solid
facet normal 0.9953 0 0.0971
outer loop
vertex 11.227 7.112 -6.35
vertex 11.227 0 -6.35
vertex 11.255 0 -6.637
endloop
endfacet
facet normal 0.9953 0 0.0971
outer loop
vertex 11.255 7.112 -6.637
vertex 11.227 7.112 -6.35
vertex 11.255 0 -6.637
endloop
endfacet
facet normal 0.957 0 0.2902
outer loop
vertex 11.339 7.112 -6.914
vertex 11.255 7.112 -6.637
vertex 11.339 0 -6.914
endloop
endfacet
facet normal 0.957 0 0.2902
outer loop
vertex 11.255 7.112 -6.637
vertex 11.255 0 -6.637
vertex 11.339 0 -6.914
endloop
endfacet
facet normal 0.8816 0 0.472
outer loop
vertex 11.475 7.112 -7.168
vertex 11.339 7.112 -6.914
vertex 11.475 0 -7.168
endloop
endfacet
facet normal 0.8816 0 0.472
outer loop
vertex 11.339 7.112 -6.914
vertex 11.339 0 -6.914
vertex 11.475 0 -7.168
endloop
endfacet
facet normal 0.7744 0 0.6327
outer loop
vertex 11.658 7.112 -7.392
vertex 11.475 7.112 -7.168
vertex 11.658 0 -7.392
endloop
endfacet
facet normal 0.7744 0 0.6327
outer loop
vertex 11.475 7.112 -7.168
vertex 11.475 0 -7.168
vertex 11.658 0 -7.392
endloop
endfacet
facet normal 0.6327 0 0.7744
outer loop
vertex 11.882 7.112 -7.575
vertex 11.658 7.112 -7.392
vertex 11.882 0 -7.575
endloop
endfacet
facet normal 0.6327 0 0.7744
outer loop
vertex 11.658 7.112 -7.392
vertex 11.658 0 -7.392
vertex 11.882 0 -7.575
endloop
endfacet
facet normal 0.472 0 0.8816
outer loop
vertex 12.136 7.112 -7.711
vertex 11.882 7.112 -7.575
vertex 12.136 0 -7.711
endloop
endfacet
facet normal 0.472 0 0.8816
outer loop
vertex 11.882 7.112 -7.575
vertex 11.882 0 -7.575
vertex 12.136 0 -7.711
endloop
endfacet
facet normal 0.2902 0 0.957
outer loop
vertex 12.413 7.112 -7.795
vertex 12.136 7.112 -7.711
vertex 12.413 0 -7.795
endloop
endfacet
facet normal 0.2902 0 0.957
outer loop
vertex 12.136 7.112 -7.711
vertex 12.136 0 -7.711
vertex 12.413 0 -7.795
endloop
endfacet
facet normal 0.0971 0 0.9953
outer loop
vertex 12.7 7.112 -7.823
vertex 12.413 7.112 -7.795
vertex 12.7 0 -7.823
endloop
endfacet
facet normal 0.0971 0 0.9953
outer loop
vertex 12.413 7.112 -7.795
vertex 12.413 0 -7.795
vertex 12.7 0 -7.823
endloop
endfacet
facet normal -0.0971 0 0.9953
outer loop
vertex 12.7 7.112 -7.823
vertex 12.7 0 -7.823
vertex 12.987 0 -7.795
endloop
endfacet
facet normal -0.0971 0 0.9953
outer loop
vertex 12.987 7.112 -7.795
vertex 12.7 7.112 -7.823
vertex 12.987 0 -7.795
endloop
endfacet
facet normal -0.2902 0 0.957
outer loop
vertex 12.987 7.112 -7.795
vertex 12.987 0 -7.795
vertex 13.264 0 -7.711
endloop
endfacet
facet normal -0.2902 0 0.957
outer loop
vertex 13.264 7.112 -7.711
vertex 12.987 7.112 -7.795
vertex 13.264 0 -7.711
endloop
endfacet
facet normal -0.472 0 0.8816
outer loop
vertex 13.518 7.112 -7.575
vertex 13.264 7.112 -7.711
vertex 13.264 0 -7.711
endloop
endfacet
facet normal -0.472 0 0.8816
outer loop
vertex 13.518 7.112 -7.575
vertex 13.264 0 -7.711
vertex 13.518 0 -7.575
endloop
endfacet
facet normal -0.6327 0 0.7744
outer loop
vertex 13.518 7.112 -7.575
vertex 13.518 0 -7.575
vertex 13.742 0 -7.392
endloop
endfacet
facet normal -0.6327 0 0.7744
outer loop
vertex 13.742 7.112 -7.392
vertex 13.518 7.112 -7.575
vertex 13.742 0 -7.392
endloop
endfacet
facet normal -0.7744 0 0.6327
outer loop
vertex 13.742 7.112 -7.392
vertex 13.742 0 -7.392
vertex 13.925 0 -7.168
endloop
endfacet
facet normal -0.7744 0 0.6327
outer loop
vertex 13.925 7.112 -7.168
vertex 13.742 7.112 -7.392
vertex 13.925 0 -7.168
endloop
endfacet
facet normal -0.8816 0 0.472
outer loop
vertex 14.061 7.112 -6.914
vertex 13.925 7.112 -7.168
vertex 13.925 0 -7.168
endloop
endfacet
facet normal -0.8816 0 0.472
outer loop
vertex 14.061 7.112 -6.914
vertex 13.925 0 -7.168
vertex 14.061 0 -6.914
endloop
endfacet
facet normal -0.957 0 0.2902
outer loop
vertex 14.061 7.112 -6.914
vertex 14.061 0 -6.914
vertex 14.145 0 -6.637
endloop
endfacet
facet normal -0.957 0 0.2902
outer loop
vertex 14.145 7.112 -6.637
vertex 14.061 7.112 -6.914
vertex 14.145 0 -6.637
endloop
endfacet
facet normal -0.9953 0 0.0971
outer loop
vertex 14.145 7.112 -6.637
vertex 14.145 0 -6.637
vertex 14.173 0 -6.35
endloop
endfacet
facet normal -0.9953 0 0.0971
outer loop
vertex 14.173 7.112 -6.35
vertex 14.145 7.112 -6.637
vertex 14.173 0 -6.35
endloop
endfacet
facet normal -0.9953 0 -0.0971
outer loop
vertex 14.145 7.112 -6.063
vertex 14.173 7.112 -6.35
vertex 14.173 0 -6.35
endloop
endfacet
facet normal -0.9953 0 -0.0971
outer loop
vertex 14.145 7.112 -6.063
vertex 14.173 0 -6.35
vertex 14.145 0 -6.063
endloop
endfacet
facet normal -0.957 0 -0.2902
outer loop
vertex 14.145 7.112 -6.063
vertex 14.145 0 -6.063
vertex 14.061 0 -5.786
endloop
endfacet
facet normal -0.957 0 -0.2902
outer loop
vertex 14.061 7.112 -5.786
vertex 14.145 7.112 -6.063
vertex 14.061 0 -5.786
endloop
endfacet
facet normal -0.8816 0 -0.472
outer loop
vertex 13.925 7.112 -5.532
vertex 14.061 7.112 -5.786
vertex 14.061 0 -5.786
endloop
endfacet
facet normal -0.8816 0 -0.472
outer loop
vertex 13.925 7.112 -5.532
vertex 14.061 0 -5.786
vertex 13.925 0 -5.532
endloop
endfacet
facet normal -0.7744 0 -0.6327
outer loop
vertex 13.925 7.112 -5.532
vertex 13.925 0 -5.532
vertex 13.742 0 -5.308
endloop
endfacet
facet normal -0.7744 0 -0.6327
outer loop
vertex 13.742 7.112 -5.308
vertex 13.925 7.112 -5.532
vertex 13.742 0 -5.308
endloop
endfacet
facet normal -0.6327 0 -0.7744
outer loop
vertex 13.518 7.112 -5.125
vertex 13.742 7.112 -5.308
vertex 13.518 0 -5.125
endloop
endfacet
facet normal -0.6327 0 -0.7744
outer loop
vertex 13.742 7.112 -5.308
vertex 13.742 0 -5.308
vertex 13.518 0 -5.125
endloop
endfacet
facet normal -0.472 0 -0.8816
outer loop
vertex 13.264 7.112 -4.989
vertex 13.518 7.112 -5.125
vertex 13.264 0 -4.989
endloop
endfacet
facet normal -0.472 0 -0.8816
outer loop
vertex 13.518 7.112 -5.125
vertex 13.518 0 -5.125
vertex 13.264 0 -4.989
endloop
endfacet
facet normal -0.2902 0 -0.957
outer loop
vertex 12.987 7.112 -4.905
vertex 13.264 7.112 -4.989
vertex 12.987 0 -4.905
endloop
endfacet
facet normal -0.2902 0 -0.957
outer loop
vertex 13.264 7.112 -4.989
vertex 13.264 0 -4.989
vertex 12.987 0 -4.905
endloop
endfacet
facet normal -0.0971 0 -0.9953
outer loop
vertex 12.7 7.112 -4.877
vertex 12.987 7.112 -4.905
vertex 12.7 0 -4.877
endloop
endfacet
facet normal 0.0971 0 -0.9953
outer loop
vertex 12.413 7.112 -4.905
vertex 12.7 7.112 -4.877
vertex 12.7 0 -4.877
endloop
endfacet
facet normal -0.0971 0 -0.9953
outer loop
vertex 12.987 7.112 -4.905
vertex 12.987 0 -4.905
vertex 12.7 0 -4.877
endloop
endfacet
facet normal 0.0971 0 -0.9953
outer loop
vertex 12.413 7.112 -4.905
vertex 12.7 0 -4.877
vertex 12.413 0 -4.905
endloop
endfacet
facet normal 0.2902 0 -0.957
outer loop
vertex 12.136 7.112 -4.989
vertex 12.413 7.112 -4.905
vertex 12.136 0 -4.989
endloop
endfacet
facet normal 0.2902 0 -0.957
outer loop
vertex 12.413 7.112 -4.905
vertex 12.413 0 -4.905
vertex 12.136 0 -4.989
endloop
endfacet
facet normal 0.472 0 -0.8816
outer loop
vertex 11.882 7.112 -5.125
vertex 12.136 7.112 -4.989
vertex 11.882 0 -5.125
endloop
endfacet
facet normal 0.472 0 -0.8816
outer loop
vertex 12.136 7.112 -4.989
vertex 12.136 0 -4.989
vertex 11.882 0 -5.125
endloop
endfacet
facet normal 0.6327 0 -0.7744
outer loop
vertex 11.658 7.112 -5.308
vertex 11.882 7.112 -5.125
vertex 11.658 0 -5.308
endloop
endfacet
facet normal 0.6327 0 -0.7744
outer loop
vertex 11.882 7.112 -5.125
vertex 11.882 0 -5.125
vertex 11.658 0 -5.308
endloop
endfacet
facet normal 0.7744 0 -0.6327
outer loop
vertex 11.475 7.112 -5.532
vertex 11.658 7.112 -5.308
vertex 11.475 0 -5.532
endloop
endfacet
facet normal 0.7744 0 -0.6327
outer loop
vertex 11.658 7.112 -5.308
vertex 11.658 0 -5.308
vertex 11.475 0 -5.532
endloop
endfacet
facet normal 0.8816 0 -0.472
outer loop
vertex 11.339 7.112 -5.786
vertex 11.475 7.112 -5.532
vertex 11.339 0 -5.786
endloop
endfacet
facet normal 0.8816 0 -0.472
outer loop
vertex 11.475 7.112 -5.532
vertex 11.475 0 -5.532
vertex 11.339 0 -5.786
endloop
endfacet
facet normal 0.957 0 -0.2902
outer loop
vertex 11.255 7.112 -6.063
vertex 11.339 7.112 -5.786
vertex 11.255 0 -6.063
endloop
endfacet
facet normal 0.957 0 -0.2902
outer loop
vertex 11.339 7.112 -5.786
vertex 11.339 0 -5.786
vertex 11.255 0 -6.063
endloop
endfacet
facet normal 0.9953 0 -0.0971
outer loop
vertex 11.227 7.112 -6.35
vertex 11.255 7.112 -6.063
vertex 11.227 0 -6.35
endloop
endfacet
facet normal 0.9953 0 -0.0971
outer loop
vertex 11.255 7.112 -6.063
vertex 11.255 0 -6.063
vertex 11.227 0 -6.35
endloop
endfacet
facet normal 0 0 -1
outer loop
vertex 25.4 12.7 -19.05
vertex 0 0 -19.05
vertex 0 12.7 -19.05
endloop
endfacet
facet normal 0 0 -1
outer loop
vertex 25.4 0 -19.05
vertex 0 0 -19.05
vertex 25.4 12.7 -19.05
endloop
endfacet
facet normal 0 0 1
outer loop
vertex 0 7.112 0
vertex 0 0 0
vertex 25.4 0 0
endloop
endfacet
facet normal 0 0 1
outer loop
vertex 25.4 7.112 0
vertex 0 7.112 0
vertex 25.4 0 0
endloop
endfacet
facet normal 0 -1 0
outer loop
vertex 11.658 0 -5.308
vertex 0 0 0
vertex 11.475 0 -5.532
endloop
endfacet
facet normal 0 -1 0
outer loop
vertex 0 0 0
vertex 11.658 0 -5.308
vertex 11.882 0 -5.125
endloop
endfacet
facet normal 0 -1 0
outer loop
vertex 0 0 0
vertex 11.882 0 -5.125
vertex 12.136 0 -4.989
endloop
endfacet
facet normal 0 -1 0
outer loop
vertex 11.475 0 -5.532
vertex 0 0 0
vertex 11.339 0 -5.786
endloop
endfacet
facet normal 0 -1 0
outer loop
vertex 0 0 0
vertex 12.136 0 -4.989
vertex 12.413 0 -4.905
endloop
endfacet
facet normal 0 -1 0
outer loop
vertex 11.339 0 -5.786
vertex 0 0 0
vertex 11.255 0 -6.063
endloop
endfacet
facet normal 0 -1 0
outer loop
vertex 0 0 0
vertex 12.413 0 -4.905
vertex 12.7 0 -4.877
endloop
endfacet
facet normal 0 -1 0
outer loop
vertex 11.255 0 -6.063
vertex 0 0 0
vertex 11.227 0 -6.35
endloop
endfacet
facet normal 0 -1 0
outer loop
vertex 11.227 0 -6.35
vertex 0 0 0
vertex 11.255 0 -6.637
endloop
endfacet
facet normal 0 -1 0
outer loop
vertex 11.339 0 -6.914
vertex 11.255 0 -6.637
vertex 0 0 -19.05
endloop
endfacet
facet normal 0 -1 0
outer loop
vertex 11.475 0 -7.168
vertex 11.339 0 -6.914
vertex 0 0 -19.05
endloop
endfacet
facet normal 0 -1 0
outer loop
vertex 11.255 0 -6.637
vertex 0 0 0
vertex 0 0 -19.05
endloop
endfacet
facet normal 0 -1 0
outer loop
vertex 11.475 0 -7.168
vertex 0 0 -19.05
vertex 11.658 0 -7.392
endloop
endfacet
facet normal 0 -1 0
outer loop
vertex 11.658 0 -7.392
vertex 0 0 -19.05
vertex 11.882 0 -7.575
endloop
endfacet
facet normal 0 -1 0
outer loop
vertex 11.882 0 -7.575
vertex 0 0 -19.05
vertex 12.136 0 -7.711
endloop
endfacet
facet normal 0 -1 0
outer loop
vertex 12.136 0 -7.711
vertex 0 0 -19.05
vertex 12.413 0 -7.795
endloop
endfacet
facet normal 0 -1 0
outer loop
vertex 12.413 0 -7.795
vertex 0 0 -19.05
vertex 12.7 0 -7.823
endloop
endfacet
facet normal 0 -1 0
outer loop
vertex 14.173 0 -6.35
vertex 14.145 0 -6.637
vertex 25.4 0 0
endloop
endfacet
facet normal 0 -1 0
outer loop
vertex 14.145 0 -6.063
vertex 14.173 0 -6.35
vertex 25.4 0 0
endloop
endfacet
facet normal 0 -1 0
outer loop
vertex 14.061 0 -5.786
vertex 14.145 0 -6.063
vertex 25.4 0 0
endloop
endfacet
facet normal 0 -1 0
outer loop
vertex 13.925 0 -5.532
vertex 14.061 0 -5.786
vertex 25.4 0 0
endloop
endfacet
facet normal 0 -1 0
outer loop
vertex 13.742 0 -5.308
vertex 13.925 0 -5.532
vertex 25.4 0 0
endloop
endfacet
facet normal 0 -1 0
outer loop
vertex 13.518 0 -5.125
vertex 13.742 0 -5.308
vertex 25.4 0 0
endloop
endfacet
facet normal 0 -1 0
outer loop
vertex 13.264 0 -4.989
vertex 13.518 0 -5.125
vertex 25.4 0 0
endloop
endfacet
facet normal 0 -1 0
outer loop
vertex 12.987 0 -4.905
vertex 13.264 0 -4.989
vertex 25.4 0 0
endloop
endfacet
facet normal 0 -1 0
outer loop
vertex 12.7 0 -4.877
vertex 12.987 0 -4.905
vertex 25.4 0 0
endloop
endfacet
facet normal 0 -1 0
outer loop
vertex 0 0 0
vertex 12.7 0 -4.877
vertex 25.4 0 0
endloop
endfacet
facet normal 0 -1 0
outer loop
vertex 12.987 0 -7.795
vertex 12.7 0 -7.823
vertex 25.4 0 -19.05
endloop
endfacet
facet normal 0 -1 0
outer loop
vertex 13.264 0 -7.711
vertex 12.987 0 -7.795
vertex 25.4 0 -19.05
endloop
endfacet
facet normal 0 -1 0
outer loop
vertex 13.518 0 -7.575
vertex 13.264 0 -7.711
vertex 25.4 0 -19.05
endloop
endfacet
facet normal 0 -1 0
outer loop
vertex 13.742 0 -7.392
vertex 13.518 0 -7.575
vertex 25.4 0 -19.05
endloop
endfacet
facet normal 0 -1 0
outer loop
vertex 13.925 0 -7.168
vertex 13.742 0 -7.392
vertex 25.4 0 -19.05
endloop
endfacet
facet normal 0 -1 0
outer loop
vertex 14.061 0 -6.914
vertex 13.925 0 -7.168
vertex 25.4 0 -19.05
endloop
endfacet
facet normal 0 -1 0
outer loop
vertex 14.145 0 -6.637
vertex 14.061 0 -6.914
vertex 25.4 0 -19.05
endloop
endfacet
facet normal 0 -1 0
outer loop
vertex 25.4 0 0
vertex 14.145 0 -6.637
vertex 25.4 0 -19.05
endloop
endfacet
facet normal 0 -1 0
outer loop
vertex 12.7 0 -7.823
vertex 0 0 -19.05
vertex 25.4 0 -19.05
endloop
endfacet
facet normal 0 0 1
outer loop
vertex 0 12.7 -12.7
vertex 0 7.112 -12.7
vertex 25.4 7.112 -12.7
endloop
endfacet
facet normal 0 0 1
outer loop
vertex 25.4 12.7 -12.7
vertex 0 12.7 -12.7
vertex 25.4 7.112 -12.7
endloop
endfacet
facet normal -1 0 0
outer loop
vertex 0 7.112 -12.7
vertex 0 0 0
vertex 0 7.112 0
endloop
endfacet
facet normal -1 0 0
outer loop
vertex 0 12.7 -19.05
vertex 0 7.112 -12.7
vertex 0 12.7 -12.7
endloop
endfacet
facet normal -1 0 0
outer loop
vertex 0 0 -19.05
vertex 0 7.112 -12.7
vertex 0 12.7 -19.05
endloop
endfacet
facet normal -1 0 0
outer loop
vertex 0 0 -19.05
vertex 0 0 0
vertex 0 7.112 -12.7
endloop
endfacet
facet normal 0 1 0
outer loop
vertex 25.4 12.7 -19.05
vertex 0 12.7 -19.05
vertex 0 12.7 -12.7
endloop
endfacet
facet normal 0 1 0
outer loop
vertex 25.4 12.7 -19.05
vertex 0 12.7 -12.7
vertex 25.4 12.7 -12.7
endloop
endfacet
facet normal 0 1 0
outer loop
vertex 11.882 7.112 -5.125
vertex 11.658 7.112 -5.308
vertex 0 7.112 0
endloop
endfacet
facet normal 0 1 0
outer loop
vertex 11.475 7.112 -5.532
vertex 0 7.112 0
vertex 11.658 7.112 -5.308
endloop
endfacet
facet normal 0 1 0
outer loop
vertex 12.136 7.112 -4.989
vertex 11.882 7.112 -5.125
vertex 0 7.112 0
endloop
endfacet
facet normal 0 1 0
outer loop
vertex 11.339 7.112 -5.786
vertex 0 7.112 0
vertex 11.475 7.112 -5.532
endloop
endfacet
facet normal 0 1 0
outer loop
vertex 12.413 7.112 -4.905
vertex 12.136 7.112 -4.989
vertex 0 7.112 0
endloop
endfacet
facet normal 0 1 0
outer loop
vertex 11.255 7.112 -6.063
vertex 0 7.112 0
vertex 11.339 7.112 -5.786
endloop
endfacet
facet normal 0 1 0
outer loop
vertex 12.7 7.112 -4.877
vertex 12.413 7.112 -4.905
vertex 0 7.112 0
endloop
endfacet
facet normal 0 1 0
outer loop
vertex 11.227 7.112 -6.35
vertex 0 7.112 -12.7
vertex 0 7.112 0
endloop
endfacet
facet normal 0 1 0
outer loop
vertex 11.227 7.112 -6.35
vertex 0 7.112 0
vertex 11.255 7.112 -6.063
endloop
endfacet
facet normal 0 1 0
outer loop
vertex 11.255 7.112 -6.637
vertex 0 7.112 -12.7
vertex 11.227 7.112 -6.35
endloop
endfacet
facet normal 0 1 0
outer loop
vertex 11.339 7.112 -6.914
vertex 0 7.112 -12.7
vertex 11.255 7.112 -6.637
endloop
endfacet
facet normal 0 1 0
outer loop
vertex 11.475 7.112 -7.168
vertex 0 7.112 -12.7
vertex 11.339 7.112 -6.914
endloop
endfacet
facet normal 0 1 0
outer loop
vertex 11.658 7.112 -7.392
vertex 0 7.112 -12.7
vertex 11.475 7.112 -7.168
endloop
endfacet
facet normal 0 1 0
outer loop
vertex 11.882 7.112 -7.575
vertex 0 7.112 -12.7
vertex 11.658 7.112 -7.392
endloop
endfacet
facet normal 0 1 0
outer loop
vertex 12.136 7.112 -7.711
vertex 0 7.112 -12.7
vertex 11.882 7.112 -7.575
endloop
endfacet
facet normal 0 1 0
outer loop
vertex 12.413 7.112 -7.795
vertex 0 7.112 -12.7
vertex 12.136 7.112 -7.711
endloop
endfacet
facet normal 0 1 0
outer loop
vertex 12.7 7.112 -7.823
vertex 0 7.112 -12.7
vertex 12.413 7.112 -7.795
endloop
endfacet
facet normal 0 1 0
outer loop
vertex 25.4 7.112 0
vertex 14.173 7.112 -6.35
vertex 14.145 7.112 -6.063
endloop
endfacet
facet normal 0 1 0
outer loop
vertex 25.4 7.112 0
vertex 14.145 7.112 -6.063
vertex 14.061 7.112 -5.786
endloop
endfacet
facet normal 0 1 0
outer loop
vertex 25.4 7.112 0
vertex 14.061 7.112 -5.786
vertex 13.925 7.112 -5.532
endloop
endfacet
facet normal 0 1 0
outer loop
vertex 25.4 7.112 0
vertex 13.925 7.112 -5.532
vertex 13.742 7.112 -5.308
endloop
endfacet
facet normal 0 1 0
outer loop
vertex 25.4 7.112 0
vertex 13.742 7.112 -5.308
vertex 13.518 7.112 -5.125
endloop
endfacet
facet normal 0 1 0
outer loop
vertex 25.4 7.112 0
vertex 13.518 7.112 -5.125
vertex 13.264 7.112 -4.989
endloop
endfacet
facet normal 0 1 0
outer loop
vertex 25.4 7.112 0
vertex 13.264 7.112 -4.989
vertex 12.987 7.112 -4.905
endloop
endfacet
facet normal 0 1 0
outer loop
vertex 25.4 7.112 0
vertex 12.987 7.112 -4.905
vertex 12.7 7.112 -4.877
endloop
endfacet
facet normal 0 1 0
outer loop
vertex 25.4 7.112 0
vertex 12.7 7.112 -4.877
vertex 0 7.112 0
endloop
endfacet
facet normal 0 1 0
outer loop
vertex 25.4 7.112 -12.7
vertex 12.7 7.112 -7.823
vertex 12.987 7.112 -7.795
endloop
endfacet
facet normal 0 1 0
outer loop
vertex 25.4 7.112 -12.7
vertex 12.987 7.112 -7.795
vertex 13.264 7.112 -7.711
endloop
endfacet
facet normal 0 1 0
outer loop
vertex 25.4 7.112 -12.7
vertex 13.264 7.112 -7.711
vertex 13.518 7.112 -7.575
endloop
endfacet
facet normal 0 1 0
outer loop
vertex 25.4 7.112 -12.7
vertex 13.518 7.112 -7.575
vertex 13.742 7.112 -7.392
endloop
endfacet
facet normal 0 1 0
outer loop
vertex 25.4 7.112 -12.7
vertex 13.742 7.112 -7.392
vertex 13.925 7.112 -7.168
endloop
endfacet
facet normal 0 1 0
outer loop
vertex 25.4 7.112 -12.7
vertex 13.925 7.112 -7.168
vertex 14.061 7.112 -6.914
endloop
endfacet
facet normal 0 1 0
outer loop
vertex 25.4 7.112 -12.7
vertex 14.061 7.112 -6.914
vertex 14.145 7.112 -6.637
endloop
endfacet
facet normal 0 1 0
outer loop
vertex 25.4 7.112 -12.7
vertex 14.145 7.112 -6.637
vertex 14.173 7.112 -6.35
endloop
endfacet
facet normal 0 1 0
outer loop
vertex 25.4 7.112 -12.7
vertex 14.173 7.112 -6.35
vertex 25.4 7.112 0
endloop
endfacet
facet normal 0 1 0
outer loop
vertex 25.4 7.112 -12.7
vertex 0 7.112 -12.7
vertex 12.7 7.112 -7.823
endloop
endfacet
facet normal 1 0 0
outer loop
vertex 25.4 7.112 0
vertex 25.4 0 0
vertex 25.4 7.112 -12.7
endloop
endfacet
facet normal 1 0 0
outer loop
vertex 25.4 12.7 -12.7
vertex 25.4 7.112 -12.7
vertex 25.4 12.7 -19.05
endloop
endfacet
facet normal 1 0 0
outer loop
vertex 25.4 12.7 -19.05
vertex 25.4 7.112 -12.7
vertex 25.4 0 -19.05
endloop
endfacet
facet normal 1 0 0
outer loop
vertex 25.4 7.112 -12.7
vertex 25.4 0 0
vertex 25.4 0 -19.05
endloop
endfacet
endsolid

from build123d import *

# Parameters (mm, degrees)
SKETCH1_W                   = 25.4
SKETCH1_H                   = 19.05
BOSS_EXTRUDE1_DEPTH         = 7.112
SKETCH2_W                   = 25.4
SKETCH2_H                   = 6.35
BOSS_EXTRUDE2_DEPTH         = 5.588
F_32_0_116_DIAMETER_HOLE1_D = 2.9464


with BuildPart() as part:
    # Sketch1 → Boss-Extrude1 (new body)
    with BuildSketch(Plane(origin=(0, 0, 0), x_dir=(1, 0, 0), z_dir=(0, 1, 0))):
        with Locations((12.7, 9.525)):
            Rectangle(SKETCH1_W, SKETCH1_H)
    extrude(amount=BOSS_EXTRUDE1_DEPTH)

    # Sketch2 → Boss-Extrude2 (add)
    with BuildSketch(Plane(origin=(0, 7.112, 0), x_dir=(1, 0, 0), z_dir=(0, 1, 0))):
        with Locations((12.7, 15.875)):
            Rectangle(SKETCH2_W, SKETCH2_H)
    extrude(amount=BOSS_EXTRUDE2_DEPTH)

    # #32 (0.116) Diameter Hole1 (through all)
    with Locations(Plane(origin=(0, 7.112, 0), x_dir=(1, 0, 0), z_dir=(0, 1, 0))):
        with Locations((12.7, 6.35)):
            Hole(F_32_0_116_DIAMETER_HOLE1_D / 2)


solid = part.part
